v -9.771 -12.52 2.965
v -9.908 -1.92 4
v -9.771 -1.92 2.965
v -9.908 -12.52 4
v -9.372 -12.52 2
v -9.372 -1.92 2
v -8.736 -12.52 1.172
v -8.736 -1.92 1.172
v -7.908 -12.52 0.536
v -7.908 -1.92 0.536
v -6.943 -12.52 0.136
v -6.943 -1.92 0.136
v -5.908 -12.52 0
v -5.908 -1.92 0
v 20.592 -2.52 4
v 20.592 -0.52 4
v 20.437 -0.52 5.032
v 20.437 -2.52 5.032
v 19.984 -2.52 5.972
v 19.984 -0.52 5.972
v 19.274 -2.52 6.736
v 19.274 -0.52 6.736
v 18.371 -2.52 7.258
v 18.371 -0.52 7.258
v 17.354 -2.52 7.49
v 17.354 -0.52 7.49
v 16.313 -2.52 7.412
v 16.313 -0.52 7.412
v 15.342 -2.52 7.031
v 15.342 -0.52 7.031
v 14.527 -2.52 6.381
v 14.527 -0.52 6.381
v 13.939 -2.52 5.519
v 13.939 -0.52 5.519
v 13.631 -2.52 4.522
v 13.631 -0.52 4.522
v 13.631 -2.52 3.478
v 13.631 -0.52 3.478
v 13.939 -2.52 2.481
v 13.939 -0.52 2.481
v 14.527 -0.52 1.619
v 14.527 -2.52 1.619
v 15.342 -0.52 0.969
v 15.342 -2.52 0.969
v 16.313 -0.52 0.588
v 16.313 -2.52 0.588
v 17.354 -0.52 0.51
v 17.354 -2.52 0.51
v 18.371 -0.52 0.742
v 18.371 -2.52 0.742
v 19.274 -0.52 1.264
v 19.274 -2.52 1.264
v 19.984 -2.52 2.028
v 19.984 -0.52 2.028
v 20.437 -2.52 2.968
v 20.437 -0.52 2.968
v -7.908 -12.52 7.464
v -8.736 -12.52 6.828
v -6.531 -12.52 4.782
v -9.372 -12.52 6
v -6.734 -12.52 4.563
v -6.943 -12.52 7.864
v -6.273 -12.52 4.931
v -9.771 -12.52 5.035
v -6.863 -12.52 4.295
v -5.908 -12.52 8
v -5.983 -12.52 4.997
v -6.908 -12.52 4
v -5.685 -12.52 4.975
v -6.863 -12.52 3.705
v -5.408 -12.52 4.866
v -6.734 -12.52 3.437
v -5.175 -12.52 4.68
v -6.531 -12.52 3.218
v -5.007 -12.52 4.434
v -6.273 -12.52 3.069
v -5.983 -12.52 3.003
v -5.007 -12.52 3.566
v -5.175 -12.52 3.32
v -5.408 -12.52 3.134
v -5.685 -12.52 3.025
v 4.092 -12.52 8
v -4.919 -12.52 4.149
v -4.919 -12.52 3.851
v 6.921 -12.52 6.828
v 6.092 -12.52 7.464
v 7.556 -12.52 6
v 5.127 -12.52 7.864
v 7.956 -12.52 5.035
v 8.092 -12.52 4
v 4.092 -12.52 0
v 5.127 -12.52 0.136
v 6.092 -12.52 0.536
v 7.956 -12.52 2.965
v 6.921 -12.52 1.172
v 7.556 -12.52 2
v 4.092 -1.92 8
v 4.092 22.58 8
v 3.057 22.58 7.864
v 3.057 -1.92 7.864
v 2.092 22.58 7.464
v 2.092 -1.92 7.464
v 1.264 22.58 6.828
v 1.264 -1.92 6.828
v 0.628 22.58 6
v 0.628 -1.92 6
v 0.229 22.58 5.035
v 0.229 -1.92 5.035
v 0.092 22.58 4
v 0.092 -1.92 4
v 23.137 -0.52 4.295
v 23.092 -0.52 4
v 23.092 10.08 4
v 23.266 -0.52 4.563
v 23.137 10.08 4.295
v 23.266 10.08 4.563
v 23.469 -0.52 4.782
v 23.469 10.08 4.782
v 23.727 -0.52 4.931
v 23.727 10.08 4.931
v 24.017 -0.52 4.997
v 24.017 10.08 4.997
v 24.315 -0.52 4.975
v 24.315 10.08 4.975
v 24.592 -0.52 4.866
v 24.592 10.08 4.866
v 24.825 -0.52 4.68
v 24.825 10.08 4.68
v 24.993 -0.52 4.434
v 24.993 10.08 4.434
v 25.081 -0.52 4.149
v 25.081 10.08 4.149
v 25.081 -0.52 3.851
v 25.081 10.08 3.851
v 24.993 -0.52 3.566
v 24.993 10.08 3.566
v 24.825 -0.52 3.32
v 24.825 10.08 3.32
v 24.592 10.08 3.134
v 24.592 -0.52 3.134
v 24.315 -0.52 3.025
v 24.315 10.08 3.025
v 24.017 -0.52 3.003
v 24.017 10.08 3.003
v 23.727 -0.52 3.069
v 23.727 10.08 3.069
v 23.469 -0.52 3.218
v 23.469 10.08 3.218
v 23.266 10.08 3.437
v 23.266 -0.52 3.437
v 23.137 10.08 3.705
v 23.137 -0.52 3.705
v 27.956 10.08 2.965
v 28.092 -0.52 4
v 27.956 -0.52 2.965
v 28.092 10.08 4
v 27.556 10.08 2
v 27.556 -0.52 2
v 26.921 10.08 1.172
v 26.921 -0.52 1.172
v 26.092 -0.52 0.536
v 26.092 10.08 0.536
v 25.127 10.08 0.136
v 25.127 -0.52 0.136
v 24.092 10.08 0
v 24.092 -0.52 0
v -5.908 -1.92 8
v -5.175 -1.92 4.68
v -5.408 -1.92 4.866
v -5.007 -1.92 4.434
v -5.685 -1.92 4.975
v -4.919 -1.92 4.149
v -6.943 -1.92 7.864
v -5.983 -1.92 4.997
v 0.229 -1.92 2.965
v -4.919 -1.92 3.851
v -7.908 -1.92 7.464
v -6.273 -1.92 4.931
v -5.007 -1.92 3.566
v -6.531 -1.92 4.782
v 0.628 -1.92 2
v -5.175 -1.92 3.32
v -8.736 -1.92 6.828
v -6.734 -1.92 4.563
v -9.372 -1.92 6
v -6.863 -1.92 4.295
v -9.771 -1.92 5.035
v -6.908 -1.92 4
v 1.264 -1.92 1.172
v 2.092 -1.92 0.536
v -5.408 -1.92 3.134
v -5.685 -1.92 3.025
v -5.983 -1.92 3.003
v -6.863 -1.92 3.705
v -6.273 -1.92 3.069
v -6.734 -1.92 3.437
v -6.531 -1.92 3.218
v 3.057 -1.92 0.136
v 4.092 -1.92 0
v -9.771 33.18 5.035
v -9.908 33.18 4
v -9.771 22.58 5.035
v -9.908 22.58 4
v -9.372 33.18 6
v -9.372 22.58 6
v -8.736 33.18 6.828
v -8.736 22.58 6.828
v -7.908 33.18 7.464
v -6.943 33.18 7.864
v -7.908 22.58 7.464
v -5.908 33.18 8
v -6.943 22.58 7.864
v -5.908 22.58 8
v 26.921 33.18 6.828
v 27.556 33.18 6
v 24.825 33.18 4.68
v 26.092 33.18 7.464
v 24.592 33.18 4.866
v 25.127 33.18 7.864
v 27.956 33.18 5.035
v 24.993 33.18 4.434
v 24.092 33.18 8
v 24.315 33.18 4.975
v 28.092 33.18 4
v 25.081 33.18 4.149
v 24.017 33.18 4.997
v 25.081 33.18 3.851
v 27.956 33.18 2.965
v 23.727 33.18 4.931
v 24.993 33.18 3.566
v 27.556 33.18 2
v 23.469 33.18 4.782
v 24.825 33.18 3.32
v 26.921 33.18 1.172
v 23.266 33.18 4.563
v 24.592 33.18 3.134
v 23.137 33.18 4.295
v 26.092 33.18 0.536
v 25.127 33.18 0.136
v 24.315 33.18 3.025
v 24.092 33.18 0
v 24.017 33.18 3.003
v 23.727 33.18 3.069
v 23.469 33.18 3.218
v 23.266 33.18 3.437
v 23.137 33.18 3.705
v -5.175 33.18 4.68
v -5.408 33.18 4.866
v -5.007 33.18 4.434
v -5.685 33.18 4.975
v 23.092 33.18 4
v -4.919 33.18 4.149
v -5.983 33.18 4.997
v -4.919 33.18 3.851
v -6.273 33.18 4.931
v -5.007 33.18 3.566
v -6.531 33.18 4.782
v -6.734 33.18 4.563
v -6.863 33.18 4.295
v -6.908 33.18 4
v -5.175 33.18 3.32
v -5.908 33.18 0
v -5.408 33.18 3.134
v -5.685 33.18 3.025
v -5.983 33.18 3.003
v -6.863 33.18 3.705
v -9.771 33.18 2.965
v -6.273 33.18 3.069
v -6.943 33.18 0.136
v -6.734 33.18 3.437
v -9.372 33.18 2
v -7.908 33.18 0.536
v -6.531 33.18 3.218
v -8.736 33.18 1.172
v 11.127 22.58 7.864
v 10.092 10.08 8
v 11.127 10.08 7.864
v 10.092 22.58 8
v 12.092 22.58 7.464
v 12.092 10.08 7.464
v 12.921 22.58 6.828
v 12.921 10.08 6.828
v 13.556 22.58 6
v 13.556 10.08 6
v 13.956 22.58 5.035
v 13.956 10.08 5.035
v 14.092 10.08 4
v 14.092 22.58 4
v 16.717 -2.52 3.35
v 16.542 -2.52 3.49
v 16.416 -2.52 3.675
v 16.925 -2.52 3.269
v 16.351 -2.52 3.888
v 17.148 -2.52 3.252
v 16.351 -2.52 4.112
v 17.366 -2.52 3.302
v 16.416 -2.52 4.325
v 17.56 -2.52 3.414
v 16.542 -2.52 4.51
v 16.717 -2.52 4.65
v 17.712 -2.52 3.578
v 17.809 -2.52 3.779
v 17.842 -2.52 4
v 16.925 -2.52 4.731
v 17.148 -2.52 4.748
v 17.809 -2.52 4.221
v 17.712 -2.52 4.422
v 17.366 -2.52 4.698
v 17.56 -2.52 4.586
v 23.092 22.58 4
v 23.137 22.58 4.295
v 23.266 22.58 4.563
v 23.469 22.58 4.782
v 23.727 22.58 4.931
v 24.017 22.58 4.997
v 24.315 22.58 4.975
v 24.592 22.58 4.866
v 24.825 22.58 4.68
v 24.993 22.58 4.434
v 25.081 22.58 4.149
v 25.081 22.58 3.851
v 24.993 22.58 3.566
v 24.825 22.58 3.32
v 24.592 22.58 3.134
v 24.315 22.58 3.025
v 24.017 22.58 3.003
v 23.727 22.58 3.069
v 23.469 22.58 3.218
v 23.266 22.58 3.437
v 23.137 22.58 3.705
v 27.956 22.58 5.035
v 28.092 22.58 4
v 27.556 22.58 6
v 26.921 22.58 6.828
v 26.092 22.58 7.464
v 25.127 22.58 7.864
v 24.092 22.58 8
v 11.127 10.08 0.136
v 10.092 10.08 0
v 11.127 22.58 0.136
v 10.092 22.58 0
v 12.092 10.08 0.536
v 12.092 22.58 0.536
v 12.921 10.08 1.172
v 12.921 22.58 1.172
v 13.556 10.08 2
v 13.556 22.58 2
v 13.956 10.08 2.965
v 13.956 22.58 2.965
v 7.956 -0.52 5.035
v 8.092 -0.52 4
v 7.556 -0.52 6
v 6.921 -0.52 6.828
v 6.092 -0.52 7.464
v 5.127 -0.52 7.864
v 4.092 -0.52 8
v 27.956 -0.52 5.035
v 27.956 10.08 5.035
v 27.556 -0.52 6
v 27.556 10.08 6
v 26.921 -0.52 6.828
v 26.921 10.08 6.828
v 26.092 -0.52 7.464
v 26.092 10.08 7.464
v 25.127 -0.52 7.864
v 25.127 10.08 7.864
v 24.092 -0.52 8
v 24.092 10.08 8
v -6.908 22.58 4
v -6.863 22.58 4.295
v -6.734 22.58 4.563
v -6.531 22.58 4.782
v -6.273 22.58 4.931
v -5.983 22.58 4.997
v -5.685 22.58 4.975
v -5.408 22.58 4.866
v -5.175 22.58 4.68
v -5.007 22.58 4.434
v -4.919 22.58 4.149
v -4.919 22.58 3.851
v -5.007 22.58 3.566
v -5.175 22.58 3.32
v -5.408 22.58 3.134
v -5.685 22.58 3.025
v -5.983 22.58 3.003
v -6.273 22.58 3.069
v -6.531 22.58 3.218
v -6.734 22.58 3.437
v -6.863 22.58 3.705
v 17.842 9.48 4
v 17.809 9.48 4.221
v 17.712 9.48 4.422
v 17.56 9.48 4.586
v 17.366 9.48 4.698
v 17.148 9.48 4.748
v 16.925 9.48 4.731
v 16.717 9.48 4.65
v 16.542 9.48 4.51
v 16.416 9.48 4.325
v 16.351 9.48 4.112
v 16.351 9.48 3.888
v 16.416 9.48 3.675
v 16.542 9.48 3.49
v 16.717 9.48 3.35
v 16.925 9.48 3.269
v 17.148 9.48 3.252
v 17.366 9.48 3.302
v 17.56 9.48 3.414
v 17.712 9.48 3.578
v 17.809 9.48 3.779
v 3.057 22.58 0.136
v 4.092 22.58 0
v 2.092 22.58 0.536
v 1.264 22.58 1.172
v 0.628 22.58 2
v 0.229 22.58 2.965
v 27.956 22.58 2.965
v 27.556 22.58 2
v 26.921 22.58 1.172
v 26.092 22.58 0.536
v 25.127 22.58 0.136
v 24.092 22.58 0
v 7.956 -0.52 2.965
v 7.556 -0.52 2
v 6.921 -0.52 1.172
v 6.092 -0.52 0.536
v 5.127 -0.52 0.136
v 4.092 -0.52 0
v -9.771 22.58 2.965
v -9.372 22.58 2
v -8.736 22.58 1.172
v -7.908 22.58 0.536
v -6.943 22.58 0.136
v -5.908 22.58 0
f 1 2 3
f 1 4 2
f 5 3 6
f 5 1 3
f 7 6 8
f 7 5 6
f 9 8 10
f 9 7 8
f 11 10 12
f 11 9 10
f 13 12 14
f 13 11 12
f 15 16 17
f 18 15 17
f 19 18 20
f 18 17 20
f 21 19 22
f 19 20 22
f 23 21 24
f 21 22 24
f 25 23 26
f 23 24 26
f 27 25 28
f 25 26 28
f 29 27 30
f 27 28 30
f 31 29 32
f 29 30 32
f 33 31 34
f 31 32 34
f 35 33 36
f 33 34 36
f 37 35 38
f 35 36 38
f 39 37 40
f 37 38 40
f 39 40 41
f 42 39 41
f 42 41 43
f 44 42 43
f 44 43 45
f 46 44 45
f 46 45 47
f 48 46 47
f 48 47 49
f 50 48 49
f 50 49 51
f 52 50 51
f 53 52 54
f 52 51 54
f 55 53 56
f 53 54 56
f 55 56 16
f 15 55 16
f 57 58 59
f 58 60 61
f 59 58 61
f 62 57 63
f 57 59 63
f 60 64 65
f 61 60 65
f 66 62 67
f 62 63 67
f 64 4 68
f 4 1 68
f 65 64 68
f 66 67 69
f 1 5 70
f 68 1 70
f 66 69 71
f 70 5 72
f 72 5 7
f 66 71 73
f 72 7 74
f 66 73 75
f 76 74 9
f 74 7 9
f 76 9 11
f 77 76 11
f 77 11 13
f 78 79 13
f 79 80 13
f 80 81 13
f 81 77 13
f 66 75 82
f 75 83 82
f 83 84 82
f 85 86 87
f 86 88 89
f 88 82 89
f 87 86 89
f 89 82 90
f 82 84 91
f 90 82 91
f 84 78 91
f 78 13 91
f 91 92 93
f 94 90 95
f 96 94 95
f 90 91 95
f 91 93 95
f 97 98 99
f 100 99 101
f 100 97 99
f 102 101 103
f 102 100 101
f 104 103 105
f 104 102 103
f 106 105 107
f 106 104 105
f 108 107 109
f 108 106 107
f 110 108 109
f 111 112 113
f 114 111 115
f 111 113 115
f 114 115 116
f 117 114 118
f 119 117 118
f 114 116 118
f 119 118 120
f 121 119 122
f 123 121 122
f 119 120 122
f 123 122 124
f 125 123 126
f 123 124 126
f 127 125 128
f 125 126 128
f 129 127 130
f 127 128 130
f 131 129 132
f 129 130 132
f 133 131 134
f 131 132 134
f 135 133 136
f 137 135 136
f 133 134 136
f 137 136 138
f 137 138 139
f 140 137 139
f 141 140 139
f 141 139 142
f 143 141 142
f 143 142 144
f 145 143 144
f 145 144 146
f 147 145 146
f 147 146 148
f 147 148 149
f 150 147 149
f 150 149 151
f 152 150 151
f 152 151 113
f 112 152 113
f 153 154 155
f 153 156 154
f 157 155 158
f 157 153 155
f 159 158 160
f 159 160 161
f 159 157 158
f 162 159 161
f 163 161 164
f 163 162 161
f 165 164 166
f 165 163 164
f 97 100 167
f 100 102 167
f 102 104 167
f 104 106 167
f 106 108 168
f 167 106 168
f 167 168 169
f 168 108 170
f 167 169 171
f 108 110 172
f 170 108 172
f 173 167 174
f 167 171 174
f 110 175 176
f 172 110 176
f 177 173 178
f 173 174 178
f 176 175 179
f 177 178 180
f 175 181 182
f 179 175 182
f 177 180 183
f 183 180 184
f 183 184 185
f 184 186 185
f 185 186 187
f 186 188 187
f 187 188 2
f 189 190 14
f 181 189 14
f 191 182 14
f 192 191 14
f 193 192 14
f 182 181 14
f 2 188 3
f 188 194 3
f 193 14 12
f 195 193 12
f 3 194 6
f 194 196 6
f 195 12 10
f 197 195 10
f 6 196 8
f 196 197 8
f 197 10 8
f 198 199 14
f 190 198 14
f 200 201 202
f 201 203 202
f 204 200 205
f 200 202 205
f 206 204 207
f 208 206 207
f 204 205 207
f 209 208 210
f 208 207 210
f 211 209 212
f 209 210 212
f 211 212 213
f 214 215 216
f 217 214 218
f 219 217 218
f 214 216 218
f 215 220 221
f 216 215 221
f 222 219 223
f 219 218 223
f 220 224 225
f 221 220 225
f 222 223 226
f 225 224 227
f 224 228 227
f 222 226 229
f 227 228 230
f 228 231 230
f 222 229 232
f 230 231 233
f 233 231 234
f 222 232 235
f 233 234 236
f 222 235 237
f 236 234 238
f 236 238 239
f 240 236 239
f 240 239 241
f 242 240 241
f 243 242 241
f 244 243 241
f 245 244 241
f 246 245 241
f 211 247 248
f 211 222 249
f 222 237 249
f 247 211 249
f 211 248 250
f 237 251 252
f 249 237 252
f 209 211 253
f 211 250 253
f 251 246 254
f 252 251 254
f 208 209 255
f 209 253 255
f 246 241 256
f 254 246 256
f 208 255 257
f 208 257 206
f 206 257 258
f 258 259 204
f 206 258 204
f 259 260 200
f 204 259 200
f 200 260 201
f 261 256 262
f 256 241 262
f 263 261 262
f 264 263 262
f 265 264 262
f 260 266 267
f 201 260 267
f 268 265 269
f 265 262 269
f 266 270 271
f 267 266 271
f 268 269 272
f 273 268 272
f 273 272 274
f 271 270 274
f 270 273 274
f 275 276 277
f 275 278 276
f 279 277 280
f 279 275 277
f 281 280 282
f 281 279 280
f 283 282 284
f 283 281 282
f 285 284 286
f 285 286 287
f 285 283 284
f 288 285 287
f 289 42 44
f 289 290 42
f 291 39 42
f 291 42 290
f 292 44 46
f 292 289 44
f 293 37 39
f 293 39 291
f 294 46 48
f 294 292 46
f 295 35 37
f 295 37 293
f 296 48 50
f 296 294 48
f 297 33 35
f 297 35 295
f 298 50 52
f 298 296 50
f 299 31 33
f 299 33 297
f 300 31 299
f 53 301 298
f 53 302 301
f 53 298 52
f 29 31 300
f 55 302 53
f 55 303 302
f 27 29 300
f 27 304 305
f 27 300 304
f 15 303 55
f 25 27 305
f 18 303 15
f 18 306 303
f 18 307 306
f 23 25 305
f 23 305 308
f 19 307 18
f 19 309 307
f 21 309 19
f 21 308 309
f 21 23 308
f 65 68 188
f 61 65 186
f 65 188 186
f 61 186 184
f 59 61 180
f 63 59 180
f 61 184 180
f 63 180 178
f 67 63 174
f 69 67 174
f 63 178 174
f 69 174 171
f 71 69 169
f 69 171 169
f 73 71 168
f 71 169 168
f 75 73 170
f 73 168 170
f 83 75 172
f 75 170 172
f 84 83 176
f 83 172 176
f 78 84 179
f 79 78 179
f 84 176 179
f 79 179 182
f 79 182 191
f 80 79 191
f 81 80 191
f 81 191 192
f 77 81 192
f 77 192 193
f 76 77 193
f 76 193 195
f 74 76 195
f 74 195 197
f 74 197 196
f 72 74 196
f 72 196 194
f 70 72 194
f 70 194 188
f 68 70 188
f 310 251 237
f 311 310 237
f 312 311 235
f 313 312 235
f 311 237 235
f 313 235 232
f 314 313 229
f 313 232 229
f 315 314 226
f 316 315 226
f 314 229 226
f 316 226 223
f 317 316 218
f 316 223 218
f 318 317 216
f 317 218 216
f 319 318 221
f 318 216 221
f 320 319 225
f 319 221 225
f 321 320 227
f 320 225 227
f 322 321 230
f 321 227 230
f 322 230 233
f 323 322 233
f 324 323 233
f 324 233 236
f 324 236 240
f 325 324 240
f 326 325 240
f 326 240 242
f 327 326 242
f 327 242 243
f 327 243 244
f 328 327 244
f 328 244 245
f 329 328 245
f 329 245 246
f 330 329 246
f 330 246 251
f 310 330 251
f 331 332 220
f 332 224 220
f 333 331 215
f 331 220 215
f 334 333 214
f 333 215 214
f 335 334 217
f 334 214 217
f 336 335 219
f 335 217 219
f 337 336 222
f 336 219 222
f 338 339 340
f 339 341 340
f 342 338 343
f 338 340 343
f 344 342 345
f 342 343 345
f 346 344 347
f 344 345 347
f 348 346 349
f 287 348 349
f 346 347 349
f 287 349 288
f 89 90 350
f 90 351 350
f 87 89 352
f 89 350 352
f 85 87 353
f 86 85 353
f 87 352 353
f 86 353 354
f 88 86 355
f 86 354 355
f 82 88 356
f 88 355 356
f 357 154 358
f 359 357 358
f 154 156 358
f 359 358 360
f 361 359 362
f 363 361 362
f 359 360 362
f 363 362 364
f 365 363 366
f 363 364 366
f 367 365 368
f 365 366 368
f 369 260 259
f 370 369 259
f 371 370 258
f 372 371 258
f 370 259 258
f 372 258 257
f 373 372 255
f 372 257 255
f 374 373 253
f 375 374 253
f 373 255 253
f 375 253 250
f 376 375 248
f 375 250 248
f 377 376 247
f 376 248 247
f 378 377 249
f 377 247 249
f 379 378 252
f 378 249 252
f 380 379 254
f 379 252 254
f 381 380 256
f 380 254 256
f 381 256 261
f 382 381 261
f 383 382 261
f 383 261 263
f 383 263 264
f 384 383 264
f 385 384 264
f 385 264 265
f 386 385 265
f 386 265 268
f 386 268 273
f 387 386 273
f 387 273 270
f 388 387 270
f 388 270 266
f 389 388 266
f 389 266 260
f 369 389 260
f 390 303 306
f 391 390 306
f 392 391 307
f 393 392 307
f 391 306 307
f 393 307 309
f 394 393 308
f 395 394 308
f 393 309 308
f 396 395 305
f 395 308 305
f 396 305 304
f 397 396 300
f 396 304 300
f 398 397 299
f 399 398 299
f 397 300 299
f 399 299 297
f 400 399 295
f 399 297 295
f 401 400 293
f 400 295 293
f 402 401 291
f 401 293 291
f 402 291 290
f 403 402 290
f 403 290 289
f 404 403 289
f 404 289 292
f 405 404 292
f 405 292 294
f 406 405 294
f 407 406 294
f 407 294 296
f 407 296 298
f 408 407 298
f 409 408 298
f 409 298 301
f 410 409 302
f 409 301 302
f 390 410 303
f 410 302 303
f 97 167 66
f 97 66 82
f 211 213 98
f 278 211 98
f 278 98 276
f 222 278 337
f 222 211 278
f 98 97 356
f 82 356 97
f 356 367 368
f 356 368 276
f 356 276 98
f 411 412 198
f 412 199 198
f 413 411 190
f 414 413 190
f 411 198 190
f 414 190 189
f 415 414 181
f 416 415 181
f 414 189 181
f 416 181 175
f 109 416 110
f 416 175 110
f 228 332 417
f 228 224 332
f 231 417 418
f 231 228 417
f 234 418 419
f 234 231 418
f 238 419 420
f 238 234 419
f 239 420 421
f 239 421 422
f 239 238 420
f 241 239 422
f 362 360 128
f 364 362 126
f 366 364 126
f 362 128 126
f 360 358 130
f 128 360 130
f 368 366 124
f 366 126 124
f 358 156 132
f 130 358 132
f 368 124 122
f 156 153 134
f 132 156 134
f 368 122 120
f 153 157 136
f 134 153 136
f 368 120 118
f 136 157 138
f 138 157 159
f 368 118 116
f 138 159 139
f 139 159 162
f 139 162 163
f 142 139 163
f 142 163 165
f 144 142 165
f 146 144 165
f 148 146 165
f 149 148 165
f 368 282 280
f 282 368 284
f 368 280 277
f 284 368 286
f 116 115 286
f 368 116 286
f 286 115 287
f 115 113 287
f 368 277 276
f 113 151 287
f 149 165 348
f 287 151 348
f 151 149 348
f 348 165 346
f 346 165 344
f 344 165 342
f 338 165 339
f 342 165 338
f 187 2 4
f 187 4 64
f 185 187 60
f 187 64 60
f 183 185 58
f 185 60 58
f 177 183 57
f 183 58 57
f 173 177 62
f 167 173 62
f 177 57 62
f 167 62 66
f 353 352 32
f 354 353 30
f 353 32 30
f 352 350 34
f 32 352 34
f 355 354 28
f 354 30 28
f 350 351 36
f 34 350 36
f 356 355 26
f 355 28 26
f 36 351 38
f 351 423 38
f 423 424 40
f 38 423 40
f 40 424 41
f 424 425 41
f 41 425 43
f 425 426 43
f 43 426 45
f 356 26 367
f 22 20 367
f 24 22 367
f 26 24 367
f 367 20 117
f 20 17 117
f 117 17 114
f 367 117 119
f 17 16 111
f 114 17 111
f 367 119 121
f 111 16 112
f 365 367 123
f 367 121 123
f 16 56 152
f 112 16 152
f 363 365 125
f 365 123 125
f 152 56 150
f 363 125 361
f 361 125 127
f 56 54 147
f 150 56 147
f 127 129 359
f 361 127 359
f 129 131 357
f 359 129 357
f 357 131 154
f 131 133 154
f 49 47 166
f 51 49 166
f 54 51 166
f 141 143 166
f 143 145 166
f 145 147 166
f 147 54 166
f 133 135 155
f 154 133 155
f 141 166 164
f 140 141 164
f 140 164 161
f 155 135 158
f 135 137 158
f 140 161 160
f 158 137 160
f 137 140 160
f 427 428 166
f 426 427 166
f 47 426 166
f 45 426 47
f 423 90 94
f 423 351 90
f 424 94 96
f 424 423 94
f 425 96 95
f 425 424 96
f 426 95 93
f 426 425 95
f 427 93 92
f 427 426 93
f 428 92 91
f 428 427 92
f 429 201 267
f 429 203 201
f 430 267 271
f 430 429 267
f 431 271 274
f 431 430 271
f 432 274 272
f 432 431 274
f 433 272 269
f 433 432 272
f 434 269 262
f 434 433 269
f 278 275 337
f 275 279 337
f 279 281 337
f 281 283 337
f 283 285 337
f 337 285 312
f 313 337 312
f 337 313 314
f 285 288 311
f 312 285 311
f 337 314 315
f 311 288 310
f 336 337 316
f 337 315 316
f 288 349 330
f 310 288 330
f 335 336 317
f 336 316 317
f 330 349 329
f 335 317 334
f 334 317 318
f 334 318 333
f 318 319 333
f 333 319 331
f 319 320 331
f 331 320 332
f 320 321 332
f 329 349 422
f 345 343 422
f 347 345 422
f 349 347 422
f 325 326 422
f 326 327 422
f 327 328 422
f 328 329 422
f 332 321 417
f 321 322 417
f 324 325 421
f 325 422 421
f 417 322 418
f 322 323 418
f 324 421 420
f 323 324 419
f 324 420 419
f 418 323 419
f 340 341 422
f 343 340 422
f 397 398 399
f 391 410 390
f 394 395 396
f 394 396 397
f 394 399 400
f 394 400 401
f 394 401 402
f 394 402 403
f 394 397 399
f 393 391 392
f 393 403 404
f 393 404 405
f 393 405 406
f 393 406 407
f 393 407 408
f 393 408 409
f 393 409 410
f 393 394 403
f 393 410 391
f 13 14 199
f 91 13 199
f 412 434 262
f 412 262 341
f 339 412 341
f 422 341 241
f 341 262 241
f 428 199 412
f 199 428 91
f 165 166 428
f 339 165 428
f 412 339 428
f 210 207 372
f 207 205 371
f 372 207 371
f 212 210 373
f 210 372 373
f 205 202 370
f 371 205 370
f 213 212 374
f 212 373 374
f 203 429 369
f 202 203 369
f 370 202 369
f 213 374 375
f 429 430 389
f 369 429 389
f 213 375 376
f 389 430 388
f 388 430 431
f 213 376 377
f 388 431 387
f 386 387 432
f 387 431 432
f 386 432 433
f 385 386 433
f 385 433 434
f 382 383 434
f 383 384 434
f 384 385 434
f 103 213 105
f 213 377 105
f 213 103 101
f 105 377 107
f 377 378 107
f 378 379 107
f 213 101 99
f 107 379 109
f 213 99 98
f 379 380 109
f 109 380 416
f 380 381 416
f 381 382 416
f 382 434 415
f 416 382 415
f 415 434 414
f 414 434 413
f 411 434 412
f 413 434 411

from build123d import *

# Parameters (mm, degrees)
F1_DEPTH = 8
F2_R     = 3.99999
F3_R     = 1
F4_DEPTH = 60
F6_R     = 3.99999
F5_R     = 3.5
F7_DEPTH = 2
F8_R     = 0.75
F9_DEPTH = 12


# Not quite as in the source:
# - a fillet or chamfer is up to 0.001 mm smaller than in the source, because OpenCascade refuses the exact size


with BuildPart() as f1:
    # F0 (on Top) → F1 (new body)
    with BuildSketch(Plane.XY):
        Polygon((-9.9077894302, -1.920078908), (-9.9077894302, -12.520078908), (8.0922105698, -12.520078908), (8.0922105698, -0.520078908), (28.0922105698, -0.520078908), (28.0922105698, 10.079921092), (14.0922105698, 10.079921092), (14.0922105698, 22.579921092), (28.0922105698, 22.579921092), (28.0922105698, 33.179921092), (-9.9077894302, 33.179921092), (-9.9077894302, 22.579921092), (0.0922105698, 22.579921092), (0.0922105698, -1.920078908), align=None)
    extrude(amount=F1_DEPTH)

    # F2 (radius 4 in the source; OpenCascade refuses exactly that, so slightly less here)
    f2_edges = [f1.edges().sort_by_distance(p)[0] for p in [
        (-9.907789, -7.220079, 8),
        (-9.907789, -7.220079, 0),
        (8.092211, -6.520079, 8),
        (8.092211, -6.520079, 0),
        (28.092211, 4.779921, 8),
        (28.092211, 4.779921, 0),
        (28.092211, 27.879921, 8),
        (28.092211, 27.879921, 0),
        (-9.907789, 27.879921, 8),
        (-9.907789, 27.879921, 0),
    ]]
    fillet(f2_edges, radius=F2_R)

    # F3 (on face) → F4 (cut)
    with BuildSketch(Plane(origin=(0, 33.179921092, 0), x_dir=(-1, 0, 0), z_dir=(0, 1, 0))):
        with Locations((-24.0922105698, 4)):
            Circle(F3_R)
        with Locations((5.9077894302, 4)):
            Circle(F3_R)
    extrude(amount=-F4_DEPTH, mode=Mode.SUBTRACT)

    # F6 (radius 4 in the source; OpenCascade refuses exactly that, so slightly less here)
    f6_edges = [f1.edges().sort_by_distance(p)[0] for p in [
        (0.092211, 10.329921, 8),
        (0.092211, 10.329921, 0),
        (14.092211, 16.329921, 8),
        (14.092211, 16.329921, 0),
    ]]
    fillet(f6_edges, radius=F6_R)

    # F5 (on face) → F7 (join)
    with BuildSketch(Plane.XZ.offset(0.520078908)):
        with Locations((17.0922105698, 4)):
            Circle(F5_R)
    extrude(amount=F7_DEPTH)

    # F8 (on face) → F9 (cut)
    with BuildSketch(Plane.XZ.offset(2.520078908)):
        with Locations((17.0922105698, 4)):
            Circle(F8_R)
    extrude(amount=-F9_DEPTH, mode=Mode.SUBTRACT)


solid = f1.part
